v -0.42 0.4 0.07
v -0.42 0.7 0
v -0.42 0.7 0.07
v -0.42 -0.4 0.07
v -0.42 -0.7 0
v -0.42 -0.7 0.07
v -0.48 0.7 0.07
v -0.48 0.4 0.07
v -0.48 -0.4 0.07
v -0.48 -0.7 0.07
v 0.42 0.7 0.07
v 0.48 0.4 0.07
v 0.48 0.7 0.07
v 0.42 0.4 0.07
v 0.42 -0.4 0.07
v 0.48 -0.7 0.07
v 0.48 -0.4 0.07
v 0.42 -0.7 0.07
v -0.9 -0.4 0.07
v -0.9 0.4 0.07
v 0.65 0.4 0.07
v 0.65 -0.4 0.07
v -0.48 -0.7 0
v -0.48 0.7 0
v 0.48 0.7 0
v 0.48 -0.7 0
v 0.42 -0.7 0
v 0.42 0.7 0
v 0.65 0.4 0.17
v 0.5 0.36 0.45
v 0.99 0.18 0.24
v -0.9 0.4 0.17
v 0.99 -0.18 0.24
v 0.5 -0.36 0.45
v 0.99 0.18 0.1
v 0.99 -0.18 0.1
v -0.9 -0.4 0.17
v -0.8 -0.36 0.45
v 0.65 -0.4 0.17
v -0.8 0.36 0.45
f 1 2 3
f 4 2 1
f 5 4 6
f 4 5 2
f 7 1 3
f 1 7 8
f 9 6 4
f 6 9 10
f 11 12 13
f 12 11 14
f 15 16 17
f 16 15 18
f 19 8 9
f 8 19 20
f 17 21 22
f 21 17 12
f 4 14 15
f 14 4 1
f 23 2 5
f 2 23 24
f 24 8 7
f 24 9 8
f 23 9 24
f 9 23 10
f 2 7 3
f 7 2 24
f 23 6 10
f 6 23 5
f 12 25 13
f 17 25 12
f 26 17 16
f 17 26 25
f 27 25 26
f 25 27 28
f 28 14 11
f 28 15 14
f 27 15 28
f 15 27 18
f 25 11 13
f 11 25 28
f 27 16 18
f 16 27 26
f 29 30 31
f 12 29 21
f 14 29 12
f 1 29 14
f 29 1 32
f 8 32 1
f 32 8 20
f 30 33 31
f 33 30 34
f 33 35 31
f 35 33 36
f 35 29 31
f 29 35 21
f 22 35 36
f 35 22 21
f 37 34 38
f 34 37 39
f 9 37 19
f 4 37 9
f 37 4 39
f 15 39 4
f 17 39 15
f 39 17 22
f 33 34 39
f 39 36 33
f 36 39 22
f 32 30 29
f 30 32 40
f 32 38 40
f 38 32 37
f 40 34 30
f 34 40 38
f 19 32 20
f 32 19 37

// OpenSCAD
// Roof box — a long streamlined cargo pod on crossbars, set on a car's
// roof (render.carRoofs gives each kind's roof height). Origin at its
// centre on the roof. Near white, tinted per car (black, grey, silver
// or white).
// Conventions, units, and axis docs: see models-src/README.md.
$fn = 12;

color([0.10, 0.10, 0.10]) for (x = [-0.45, 0.45])
    translate([x - 0.03, -0.70, 0]) cube([0.06, 1.40, 0.07]);
color([0.92, 0.92, 0.92]) hull() {
    translate([-0.90, -0.40, 0.07]) cube([1.55, 0.80, 0.10]);
    translate([-0.80, -0.36, 0.07]) cube([1.30, 0.72, 0.38]);
    translate([0.95, -0.18, 0.10]) cube([0.04, 0.36, 0.14]);
}
